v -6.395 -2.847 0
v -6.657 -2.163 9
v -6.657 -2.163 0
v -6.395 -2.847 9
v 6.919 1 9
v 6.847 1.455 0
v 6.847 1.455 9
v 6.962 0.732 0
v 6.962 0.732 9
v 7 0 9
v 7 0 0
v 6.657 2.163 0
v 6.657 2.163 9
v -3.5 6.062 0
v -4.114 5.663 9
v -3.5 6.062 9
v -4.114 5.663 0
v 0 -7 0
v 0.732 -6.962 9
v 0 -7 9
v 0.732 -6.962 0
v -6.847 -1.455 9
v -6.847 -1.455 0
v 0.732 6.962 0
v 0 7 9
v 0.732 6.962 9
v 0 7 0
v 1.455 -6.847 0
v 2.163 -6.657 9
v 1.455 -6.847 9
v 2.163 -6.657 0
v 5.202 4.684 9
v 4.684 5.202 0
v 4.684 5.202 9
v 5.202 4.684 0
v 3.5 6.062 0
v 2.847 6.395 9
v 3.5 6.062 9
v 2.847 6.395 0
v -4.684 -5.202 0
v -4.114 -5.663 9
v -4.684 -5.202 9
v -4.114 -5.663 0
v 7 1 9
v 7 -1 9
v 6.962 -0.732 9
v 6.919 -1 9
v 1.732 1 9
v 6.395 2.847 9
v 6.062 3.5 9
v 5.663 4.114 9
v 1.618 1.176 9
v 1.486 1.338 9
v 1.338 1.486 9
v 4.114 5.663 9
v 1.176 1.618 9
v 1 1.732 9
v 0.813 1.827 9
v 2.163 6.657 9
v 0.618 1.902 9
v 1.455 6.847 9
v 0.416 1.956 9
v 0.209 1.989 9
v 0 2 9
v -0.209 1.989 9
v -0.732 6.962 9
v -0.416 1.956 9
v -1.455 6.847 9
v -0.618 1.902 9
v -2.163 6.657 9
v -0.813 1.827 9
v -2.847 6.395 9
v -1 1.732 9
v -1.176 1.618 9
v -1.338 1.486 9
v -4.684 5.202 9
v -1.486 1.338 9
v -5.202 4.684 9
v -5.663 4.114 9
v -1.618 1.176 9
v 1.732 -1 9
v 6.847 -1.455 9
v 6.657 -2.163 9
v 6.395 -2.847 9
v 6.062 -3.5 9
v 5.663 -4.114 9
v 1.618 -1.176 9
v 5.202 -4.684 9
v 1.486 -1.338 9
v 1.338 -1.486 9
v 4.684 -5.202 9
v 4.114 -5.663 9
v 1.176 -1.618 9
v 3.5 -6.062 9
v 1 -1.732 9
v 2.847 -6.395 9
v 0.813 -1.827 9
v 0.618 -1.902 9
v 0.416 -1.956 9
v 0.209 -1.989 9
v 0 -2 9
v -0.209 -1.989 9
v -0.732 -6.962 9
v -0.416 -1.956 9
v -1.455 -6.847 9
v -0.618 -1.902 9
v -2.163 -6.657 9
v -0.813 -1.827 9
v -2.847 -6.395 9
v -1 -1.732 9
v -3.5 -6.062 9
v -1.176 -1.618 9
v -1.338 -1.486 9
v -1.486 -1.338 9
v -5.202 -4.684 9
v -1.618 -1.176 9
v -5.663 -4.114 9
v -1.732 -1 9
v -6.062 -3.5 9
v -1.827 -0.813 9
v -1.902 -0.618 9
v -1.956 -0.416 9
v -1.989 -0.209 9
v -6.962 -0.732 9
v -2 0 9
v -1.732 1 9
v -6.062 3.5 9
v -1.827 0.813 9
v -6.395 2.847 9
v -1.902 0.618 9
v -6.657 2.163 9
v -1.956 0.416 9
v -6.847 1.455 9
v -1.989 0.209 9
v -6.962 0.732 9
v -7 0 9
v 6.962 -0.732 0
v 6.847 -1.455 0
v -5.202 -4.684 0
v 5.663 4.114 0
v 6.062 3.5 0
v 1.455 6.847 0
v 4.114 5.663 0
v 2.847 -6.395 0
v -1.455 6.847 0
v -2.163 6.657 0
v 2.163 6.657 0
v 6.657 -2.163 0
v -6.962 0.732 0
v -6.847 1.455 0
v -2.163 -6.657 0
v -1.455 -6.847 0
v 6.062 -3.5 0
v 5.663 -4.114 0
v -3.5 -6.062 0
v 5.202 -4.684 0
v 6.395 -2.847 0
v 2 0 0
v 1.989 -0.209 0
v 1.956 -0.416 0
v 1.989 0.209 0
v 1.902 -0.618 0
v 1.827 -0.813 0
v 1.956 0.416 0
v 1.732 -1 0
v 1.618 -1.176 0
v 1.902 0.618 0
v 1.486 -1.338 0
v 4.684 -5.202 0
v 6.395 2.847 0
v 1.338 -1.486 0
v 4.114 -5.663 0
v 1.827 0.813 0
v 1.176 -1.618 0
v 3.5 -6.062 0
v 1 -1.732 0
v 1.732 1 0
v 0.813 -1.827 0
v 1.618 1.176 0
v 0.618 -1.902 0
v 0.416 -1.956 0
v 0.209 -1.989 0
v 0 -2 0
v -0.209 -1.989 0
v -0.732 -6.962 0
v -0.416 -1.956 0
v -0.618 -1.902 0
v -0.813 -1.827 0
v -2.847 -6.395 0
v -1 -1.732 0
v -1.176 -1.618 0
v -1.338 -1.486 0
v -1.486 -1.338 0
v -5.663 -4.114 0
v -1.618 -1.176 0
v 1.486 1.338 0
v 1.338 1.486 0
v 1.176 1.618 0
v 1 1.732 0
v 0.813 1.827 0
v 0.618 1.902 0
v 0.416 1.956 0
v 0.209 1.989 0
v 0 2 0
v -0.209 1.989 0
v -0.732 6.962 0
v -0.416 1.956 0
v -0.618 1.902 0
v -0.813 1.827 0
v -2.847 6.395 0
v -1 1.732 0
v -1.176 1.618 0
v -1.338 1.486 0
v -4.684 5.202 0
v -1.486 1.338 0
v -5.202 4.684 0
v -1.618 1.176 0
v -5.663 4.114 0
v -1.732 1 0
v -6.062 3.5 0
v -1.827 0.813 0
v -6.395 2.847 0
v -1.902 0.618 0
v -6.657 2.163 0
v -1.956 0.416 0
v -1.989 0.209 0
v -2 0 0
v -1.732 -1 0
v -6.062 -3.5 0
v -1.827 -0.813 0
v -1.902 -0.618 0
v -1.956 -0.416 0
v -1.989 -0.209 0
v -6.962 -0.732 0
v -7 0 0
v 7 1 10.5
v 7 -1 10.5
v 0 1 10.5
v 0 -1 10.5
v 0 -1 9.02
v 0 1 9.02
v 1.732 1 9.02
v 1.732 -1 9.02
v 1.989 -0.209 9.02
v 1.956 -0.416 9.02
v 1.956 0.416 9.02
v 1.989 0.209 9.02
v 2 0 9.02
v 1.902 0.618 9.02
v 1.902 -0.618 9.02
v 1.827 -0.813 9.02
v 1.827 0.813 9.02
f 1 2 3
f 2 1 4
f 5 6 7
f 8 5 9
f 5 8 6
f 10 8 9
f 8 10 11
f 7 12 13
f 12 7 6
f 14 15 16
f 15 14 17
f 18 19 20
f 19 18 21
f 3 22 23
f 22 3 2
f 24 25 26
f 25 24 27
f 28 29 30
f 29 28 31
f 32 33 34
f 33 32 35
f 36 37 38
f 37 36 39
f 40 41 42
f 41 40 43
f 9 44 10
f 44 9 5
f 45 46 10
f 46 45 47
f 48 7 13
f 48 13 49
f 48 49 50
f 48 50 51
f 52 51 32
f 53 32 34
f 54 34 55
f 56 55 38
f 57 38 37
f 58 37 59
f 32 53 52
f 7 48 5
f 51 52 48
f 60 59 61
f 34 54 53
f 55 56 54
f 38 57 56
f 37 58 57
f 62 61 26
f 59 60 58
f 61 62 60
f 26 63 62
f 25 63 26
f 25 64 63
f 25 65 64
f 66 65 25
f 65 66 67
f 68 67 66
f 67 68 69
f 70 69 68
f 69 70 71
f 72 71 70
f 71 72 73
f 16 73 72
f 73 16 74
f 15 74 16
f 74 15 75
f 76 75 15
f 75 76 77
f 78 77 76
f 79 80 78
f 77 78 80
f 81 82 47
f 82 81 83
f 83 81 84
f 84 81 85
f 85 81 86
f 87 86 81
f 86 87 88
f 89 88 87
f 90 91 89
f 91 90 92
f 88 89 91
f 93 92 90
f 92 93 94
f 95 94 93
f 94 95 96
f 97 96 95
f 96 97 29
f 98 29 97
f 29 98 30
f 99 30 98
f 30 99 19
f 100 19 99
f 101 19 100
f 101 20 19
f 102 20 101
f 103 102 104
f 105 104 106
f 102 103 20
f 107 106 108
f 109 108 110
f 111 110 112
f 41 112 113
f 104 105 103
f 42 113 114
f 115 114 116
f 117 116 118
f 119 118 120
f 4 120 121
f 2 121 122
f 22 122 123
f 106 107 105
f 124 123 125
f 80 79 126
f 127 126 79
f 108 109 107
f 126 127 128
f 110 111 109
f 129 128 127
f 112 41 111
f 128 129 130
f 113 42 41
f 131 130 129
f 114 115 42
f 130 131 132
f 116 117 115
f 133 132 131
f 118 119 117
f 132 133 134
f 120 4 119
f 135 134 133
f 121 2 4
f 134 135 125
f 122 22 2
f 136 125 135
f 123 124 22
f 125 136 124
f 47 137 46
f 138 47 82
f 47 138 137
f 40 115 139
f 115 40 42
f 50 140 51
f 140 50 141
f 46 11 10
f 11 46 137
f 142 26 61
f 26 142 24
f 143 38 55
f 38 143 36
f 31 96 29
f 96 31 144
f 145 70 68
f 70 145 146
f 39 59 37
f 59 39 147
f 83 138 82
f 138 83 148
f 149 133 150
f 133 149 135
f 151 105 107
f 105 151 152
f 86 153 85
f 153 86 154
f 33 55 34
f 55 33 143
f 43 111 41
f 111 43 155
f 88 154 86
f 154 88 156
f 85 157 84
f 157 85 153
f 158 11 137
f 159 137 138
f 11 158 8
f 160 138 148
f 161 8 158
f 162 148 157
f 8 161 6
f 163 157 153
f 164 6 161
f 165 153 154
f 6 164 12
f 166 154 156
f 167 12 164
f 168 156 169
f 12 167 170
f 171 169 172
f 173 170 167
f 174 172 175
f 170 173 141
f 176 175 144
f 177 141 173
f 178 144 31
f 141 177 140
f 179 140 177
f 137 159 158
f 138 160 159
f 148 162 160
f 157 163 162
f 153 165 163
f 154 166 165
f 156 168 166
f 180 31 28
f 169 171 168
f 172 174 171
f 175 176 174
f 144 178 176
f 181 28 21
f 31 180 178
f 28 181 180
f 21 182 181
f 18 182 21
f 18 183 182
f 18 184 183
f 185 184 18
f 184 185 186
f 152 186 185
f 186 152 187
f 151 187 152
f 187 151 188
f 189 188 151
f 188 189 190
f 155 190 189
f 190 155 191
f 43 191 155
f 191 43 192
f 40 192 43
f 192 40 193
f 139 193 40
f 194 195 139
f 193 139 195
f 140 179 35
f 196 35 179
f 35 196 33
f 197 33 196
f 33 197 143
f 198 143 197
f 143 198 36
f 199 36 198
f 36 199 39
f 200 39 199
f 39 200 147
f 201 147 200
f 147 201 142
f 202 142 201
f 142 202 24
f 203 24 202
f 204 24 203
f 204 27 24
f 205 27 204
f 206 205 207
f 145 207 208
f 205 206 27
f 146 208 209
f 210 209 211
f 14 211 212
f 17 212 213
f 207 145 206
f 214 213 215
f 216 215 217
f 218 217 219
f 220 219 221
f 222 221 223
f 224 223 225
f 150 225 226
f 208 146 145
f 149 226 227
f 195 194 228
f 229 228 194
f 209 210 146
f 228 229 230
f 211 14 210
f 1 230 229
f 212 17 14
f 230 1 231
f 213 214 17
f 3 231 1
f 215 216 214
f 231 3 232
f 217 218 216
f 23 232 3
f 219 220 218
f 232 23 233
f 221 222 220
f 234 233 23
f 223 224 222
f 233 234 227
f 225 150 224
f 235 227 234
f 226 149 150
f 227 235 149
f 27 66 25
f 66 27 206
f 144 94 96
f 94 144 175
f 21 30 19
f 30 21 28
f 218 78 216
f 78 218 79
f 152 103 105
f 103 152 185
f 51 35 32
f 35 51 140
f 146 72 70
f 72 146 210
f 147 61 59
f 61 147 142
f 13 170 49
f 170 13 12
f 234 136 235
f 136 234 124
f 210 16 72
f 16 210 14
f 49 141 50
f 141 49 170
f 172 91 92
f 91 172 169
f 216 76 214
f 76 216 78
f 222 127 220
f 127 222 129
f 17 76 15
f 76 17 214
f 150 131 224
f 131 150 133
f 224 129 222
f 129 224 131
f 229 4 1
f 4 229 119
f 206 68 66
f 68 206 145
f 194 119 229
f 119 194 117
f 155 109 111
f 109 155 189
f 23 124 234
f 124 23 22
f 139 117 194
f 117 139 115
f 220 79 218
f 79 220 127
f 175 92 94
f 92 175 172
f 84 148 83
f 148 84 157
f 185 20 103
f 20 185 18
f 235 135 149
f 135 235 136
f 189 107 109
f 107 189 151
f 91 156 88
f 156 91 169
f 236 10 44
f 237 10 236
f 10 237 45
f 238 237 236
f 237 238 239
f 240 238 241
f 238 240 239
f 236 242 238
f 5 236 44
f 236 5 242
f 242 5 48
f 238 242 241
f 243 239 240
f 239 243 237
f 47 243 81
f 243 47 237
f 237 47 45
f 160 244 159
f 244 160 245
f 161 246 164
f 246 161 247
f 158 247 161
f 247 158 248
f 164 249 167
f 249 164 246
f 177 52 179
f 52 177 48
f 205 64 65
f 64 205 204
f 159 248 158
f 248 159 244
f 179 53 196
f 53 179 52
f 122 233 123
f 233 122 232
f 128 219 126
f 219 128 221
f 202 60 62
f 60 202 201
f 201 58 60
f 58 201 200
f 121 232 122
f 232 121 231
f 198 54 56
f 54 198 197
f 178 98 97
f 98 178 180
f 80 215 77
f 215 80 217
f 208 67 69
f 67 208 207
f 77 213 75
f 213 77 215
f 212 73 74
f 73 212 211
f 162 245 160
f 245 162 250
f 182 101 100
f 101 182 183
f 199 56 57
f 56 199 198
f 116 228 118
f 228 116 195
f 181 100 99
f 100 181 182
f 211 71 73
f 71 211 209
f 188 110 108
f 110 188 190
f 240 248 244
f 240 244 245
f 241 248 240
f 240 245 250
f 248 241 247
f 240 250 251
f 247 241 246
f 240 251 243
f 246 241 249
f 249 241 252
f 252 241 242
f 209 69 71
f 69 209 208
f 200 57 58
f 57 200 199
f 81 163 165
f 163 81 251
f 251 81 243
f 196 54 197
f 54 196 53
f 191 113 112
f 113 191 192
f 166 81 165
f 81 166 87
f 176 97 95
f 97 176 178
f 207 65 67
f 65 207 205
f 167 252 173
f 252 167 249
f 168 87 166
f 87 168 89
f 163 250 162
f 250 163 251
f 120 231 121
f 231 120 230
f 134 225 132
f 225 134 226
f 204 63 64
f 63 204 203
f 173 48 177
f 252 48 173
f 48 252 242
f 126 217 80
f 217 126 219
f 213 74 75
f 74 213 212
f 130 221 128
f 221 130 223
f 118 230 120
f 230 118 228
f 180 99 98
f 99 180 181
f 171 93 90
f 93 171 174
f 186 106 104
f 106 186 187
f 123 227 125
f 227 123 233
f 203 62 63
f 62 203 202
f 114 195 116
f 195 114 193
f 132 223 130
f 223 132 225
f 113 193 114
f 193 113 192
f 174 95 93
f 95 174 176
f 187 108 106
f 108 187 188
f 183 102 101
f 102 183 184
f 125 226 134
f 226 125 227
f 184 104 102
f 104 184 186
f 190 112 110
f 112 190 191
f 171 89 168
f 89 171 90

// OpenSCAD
// Pointer control knob.
$fn = 60;
eps = 0.02;
bore_d = 4;
knob_d = 14;
knob_h = 9;
difference() { union() { cylinder(d=knob_d,h=knob_h); translate([0,-1,knob_h]) cube([knob_d/2,2,1.5]); } translate([0,0,-eps]) cylinder(d=bore_d,h=knob_h+2*eps); }
